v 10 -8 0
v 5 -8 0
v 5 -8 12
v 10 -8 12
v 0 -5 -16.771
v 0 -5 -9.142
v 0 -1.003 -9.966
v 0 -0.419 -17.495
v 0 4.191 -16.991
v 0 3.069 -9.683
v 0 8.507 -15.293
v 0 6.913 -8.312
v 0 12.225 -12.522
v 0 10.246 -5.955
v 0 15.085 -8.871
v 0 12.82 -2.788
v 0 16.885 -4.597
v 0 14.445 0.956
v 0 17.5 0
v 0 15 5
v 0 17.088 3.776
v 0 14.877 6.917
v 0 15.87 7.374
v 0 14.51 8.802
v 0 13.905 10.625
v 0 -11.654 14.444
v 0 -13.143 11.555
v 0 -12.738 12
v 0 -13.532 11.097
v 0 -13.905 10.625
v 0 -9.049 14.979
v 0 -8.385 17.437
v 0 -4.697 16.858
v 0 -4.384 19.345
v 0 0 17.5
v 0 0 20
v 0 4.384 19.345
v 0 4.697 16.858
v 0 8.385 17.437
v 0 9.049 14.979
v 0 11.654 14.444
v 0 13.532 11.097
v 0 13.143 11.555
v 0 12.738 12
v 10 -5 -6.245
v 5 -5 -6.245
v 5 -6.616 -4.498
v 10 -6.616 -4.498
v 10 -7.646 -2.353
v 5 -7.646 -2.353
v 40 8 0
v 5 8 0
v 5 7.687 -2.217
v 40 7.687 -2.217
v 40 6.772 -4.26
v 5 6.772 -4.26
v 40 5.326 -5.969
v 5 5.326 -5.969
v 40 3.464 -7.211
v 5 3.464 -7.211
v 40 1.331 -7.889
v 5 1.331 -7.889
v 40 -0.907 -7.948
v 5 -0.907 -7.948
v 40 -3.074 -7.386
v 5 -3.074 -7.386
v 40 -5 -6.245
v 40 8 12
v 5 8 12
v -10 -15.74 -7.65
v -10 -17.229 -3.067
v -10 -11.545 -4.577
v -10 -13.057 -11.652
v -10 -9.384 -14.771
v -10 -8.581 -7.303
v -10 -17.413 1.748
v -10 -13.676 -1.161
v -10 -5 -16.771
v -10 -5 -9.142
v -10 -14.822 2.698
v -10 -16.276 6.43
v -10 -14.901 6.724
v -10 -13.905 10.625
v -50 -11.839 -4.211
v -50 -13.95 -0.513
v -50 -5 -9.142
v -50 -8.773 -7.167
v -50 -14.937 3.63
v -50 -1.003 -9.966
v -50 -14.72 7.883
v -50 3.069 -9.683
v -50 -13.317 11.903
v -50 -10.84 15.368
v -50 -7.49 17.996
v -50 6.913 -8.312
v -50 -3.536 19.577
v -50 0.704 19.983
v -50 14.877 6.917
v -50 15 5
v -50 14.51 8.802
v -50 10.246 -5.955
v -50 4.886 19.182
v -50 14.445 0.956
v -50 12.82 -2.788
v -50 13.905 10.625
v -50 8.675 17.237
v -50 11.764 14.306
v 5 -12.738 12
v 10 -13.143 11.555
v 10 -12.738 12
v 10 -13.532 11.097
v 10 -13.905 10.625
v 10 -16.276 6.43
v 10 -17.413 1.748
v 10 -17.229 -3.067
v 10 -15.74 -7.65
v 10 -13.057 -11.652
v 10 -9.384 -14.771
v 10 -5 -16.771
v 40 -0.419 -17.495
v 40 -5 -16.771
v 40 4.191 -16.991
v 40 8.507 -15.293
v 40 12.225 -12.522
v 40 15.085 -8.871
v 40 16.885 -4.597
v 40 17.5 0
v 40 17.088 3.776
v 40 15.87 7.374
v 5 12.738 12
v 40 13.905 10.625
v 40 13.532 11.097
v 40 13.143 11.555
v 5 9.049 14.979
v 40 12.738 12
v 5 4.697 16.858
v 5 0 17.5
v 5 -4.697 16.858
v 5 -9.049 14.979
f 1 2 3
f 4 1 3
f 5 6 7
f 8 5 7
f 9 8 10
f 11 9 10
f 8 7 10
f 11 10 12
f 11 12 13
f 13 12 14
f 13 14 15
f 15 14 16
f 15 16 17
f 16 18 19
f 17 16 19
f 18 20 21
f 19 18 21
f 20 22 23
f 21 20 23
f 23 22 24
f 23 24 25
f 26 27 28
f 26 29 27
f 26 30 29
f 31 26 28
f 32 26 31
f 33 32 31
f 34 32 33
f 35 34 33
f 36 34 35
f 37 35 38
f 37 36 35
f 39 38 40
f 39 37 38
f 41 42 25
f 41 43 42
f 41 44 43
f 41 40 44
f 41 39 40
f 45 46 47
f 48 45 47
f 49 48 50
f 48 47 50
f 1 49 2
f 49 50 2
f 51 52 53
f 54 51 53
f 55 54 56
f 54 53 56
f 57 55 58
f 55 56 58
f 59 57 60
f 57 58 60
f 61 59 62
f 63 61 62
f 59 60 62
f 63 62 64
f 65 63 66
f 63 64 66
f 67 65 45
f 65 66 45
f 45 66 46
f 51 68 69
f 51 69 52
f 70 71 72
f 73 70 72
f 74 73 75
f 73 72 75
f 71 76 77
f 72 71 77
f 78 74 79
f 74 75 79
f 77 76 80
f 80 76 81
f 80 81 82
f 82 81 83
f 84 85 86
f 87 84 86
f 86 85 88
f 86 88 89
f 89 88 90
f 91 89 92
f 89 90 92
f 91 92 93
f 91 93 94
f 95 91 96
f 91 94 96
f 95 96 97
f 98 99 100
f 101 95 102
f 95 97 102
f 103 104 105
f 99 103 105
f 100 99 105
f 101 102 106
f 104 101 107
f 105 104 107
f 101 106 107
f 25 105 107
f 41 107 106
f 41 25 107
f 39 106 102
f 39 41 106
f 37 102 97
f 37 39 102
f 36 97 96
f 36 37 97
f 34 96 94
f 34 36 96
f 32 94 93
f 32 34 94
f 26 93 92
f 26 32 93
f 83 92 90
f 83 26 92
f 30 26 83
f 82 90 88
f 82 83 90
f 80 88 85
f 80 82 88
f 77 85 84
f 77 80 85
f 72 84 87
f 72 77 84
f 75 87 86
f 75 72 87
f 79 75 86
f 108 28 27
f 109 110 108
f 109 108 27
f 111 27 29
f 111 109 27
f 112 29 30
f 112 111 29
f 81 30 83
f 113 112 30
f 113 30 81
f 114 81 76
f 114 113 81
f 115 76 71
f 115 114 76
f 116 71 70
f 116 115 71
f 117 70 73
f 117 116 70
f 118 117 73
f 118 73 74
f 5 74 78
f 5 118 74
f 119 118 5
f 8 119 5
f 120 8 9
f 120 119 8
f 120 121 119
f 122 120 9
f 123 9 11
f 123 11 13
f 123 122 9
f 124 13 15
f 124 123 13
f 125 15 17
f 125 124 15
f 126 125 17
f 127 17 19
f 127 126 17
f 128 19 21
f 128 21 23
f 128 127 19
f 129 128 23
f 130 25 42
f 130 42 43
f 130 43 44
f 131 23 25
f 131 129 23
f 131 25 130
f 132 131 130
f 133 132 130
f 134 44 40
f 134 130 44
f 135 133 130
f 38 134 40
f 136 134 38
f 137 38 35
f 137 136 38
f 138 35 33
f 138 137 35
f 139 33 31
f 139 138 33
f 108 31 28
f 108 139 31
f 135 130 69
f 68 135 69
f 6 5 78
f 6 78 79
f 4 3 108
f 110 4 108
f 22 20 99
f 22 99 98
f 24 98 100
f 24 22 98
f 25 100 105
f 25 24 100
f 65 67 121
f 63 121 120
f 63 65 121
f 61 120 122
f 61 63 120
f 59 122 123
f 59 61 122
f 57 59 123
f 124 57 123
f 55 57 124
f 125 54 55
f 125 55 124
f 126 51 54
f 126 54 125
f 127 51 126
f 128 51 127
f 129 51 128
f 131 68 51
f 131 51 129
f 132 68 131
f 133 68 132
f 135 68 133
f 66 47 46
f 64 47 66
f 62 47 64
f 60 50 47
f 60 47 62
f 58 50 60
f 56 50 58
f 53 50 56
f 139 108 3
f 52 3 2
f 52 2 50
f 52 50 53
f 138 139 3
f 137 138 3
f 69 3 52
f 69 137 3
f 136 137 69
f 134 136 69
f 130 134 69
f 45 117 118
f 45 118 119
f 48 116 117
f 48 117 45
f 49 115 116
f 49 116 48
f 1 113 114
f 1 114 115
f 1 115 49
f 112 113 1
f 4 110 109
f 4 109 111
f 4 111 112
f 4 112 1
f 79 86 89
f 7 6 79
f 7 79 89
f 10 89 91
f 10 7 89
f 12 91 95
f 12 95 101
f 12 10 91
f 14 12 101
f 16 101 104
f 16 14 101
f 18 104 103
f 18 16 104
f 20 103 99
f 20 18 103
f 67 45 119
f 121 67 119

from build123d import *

# Parameters (mm, degrees)
F1_DEPTH = 5
F3_DEPTH = 35
F5_DEPTH = 5
F6_DEPTH = 10
F7_DEPTH = 50


with BuildPart() as f1:
    # F0 (on Right) → F1 (new body)
    with BuildSketch(Plane.YZ):
        with BuildLine():
            ThreePointArc((17.5, 0), (16.5770023354, 5.6082968512), (13.9053721633, 10.625))
            ThreePointArc((13.9053721633, 10.625), (14.7238001625, 7.8652589369), (15, 5))
            ThreePointArc((15, 5), (8.6602540378, -7.2474487139), (-5, -9.1421356237))
            Line((-5, -9.1421356237), (-5, -16.7705098312))
            ThreePointArc((-5, -16.7705098312), (10.4582503317, -14.0312152004), (17.5, 0))
        make_face()
        with BuildLine():
            ThreePointArc((13.9053721633, 10.625), (13.3392841662, 11.3275548082), (12.7377392029, 12))
            Line((12.7377392029, 12), (8, 12))
            Line((8, 12), (8, 0))
            ThreePointArc((8, 0), (3.4641016151, -7.2111025509), (-5, -6.2449979984))
            Line((-5, -6.2449979984), (-5, -9.1421356237))
            ThreePointArc((-5, -9.1421356237), (8.6602540378, -7.2474487139), (15, 5))
            ThreePointArc((15, 5), (14.7238001625, 7.8652589369), (13.9053721633, 10.625))
        make_face()
        with BuildLine():
            Line((8, 12), (12.7377392029, 12))
            ThreePointArc((12.7377392029, 12), (0, 17.5), (-12.7377392029, 12))
            Line((-12.7377392029, 12), (-8, 12))
            Line((-8, 12), (-8, 0))
            ThreePointArc((-8, 0), (-7.2111025509, -3.4641016151), (-5, -6.2449979984))
            ThreePointArc((-5, -6.2449979984), (3.4641016151, -7.2111025509), (8, 0))
            Line((8, 0), (8, 12))
        make_face()
        with BuildLine():
            Line((-8, 12), (-12.7377392029, 12))
            ThreePointArc((-12.7377392029, 12), (-13.3392841662, 11.3275548082), (-13.9053721633, 10.625))
            ThreePointArc((-13.9053721633, 10.625), (-13.6761905094, -1.1613158619), (-5, -9.1421356237))
            Line((-5, -9.1421356237), (-5, -6.2449979984))
            ThreePointArc((-5, -6.2449979984), (-7.2111025509, -3.4641016151), (-8, 0))
            Line((-8, 0), (-8, 12))
        make_face()
        with BuildLine():
            ThreePointArc((-5, -9.1421356237), (-13.6761905094, -1.1613158619), (-13.9053721633, 10.625))
            ThreePointArc((-13.9053721633, 10.625), (-16.6427691172, -5.4100125798), (-5, -16.7705098312))
            Line((-5, -16.7705098312), (-5, -9.1421356237))
        make_face()
    extrude(amount=F1_DEPTH)

    # F2 (on face) → F3 (join)
    with BuildSketch(Plane.YZ.offset(5)):
        with BuildLine():
            ThreePointArc((15, 5), (8.6602540378, -7.2474487139), (-5, -9.1421356237))
            Line((-5, -9.1421356237), (-5, -16.7705098312))
            ThreePointArc((-5, -16.7705098312), (10.4582503317, -14.0312152004), (17.5, 0))
            ThreePointArc((17.5, 0), (16.5770023354, 5.6082968512), (13.9053721633, 10.625))
            ThreePointArc((13.9053721633, 10.625), (14.7238001625, 7.8652589369), (15, 5))
        make_face()
        with BuildLine():
            ThreePointArc((8, 0), (3.4641016151, -7.2111025509), (-5, -6.2449979984))
            Line((-5, -6.2449979984), (-5, -9.1421356237))
            ThreePointArc((-5, -9.1421356237), (8.6602540378, -7.2474487139), (15, 5))
            ThreePointArc((15, 5), (14.7238001625, 7.8652589369), (13.9053721633, 10.625))
            ThreePointArc((13.9053721633, 10.625), (13.3392841662, 11.3275548082), (12.7377392029, 12))
            Line((12.7377392029, 12), (8, 12))
            Line((8, 12), (8, 0))
        make_face()
    extrude(amount=F3_DEPTH)

    # F4 (on face) → F5 (join)
    with BuildSketch(Plane.YZ.offset(5)):
        with BuildLine():
            ThreePointArc((-13.9053721633, 10.625), (-16.6427691172, -5.4100125798), (-5, -16.7705098312))
            Line((-5, -16.7705098312), (-5, -9.1421356237))
            ThreePointArc((-5, -9.1421356237), (-13.6761905094, -1.1613158619), (-13.9053721633, 10.625))
        make_face()
        with BuildLine():
            ThreePointArc((-13.9053721633, 10.625), (-13.6761905094, -1.1613158619), (-5, -9.1421356237))
            Line((-5, -9.1421356237), (-5, -6.2449979984))
            ThreePointArc((-5, -6.2449979984), (-7.2111025509, -3.4641016151), (-8, 0))
            Line((-8, 0), (-8, 12))
            Line((-8, 12), (-12.7377392029, 12))
            ThreePointArc((-12.7377392029, 12), (-13.3392841662, 11.3275548082), (-13.9053721633, 10.625))
        make_face()
    extrude(amount=F5_DEPTH)

    # F0 (on Right) → F6 (join)
    with BuildSketch(Plane.YZ):
        with BuildLine():
            ThreePointArc((-5, -9.1421356237), (-13.6761905094, -1.1613158619), (-13.9053721633, 10.625))
            ThreePointArc((-13.9053721633, 10.625), (-16.6427691172, -5.4100125798), (-5, -16.7705098312))
            Line((-5, -16.7705098312), (-5, -9.1421356237))
        make_face()
    extrude(amount=-F6_DEPTH)

    # F0 (on Right) → F7 (join)
    with BuildSketch(Plane.YZ):
        with BuildLine():
            ThreePointArc((-12.7377392029, 12), (0, 17.5), (12.7377392029, 12))
            ThreePointArc((12.7377392029, 12), (13.3392841662, 11.3275548082), (13.9053721633, 10.625))
            ThreePointArc((13.9053721633, 10.625), (0, 20), (-13.9053721633, 10.625))
            ThreePointArc((-13.9053721633, 10.625), (-13.3392841662, 11.3275548082), (-12.7377392029, 12))
        make_face()
        with BuildLine():
            Line((8, 12), (12.7377392029, 12))
            ThreePointArc((12.7377392029, 12), (0, 17.5), (-12.7377392029, 12))
            Line((-12.7377392029, 12), (-8, 12))
            Line((-8, 12), (-8, 0))
            ThreePointArc((-8, 0), (-7.2111025509, -3.4641016151), (-5, -6.2449979984))
            ThreePointArc((-5, -6.2449979984), (3.4641016151, -7.2111025509), (8, 0))
            Line((8, 0), (8, 12))
        make_face()
        with BuildLine():
            Line((-8, 12), (-12.7377392029, 12))
            ThreePointArc((-12.7377392029, 12), (-13.3392841662, 11.3275548082), (-13.9053721633, 10.625))
            ThreePointArc((-13.9053721633, 10.625), (-13.6761905094, -1.1613158619), (-5, -9.1421356237))
            Line((-5, -9.1421356237), (-5, -6.2449979984))
            ThreePointArc((-5, -6.2449979984), (-7.2111025509, -3.4641016151), (-8, 0))
            Line((-8, 0), (-8, 12))
        make_face()
        with BuildLine():
            ThreePointArc((13.9053721633, 10.625), (13.3392841662, 11.3275548082), (12.7377392029, 12))
            Line((12.7377392029, 12), (8, 12))
            Line((8, 12), (8, 0))
            ThreePointArc((8, 0), (3.4641016151, -7.2111025509), (-5, -6.2449979984))
            Line((-5, -6.2449979984), (-5, -9.1421356237))
            ThreePointArc((-5, -9.1421356237), (8.6602540378, -7.2474487139), (15, 5))
            ThreePointArc((15, 5), (14.7238001625, 7.8652589369), (13.9053721633, 10.625))
        make_face()
    extrude(amount=-F7_DEPTH)


solid = f1.part
